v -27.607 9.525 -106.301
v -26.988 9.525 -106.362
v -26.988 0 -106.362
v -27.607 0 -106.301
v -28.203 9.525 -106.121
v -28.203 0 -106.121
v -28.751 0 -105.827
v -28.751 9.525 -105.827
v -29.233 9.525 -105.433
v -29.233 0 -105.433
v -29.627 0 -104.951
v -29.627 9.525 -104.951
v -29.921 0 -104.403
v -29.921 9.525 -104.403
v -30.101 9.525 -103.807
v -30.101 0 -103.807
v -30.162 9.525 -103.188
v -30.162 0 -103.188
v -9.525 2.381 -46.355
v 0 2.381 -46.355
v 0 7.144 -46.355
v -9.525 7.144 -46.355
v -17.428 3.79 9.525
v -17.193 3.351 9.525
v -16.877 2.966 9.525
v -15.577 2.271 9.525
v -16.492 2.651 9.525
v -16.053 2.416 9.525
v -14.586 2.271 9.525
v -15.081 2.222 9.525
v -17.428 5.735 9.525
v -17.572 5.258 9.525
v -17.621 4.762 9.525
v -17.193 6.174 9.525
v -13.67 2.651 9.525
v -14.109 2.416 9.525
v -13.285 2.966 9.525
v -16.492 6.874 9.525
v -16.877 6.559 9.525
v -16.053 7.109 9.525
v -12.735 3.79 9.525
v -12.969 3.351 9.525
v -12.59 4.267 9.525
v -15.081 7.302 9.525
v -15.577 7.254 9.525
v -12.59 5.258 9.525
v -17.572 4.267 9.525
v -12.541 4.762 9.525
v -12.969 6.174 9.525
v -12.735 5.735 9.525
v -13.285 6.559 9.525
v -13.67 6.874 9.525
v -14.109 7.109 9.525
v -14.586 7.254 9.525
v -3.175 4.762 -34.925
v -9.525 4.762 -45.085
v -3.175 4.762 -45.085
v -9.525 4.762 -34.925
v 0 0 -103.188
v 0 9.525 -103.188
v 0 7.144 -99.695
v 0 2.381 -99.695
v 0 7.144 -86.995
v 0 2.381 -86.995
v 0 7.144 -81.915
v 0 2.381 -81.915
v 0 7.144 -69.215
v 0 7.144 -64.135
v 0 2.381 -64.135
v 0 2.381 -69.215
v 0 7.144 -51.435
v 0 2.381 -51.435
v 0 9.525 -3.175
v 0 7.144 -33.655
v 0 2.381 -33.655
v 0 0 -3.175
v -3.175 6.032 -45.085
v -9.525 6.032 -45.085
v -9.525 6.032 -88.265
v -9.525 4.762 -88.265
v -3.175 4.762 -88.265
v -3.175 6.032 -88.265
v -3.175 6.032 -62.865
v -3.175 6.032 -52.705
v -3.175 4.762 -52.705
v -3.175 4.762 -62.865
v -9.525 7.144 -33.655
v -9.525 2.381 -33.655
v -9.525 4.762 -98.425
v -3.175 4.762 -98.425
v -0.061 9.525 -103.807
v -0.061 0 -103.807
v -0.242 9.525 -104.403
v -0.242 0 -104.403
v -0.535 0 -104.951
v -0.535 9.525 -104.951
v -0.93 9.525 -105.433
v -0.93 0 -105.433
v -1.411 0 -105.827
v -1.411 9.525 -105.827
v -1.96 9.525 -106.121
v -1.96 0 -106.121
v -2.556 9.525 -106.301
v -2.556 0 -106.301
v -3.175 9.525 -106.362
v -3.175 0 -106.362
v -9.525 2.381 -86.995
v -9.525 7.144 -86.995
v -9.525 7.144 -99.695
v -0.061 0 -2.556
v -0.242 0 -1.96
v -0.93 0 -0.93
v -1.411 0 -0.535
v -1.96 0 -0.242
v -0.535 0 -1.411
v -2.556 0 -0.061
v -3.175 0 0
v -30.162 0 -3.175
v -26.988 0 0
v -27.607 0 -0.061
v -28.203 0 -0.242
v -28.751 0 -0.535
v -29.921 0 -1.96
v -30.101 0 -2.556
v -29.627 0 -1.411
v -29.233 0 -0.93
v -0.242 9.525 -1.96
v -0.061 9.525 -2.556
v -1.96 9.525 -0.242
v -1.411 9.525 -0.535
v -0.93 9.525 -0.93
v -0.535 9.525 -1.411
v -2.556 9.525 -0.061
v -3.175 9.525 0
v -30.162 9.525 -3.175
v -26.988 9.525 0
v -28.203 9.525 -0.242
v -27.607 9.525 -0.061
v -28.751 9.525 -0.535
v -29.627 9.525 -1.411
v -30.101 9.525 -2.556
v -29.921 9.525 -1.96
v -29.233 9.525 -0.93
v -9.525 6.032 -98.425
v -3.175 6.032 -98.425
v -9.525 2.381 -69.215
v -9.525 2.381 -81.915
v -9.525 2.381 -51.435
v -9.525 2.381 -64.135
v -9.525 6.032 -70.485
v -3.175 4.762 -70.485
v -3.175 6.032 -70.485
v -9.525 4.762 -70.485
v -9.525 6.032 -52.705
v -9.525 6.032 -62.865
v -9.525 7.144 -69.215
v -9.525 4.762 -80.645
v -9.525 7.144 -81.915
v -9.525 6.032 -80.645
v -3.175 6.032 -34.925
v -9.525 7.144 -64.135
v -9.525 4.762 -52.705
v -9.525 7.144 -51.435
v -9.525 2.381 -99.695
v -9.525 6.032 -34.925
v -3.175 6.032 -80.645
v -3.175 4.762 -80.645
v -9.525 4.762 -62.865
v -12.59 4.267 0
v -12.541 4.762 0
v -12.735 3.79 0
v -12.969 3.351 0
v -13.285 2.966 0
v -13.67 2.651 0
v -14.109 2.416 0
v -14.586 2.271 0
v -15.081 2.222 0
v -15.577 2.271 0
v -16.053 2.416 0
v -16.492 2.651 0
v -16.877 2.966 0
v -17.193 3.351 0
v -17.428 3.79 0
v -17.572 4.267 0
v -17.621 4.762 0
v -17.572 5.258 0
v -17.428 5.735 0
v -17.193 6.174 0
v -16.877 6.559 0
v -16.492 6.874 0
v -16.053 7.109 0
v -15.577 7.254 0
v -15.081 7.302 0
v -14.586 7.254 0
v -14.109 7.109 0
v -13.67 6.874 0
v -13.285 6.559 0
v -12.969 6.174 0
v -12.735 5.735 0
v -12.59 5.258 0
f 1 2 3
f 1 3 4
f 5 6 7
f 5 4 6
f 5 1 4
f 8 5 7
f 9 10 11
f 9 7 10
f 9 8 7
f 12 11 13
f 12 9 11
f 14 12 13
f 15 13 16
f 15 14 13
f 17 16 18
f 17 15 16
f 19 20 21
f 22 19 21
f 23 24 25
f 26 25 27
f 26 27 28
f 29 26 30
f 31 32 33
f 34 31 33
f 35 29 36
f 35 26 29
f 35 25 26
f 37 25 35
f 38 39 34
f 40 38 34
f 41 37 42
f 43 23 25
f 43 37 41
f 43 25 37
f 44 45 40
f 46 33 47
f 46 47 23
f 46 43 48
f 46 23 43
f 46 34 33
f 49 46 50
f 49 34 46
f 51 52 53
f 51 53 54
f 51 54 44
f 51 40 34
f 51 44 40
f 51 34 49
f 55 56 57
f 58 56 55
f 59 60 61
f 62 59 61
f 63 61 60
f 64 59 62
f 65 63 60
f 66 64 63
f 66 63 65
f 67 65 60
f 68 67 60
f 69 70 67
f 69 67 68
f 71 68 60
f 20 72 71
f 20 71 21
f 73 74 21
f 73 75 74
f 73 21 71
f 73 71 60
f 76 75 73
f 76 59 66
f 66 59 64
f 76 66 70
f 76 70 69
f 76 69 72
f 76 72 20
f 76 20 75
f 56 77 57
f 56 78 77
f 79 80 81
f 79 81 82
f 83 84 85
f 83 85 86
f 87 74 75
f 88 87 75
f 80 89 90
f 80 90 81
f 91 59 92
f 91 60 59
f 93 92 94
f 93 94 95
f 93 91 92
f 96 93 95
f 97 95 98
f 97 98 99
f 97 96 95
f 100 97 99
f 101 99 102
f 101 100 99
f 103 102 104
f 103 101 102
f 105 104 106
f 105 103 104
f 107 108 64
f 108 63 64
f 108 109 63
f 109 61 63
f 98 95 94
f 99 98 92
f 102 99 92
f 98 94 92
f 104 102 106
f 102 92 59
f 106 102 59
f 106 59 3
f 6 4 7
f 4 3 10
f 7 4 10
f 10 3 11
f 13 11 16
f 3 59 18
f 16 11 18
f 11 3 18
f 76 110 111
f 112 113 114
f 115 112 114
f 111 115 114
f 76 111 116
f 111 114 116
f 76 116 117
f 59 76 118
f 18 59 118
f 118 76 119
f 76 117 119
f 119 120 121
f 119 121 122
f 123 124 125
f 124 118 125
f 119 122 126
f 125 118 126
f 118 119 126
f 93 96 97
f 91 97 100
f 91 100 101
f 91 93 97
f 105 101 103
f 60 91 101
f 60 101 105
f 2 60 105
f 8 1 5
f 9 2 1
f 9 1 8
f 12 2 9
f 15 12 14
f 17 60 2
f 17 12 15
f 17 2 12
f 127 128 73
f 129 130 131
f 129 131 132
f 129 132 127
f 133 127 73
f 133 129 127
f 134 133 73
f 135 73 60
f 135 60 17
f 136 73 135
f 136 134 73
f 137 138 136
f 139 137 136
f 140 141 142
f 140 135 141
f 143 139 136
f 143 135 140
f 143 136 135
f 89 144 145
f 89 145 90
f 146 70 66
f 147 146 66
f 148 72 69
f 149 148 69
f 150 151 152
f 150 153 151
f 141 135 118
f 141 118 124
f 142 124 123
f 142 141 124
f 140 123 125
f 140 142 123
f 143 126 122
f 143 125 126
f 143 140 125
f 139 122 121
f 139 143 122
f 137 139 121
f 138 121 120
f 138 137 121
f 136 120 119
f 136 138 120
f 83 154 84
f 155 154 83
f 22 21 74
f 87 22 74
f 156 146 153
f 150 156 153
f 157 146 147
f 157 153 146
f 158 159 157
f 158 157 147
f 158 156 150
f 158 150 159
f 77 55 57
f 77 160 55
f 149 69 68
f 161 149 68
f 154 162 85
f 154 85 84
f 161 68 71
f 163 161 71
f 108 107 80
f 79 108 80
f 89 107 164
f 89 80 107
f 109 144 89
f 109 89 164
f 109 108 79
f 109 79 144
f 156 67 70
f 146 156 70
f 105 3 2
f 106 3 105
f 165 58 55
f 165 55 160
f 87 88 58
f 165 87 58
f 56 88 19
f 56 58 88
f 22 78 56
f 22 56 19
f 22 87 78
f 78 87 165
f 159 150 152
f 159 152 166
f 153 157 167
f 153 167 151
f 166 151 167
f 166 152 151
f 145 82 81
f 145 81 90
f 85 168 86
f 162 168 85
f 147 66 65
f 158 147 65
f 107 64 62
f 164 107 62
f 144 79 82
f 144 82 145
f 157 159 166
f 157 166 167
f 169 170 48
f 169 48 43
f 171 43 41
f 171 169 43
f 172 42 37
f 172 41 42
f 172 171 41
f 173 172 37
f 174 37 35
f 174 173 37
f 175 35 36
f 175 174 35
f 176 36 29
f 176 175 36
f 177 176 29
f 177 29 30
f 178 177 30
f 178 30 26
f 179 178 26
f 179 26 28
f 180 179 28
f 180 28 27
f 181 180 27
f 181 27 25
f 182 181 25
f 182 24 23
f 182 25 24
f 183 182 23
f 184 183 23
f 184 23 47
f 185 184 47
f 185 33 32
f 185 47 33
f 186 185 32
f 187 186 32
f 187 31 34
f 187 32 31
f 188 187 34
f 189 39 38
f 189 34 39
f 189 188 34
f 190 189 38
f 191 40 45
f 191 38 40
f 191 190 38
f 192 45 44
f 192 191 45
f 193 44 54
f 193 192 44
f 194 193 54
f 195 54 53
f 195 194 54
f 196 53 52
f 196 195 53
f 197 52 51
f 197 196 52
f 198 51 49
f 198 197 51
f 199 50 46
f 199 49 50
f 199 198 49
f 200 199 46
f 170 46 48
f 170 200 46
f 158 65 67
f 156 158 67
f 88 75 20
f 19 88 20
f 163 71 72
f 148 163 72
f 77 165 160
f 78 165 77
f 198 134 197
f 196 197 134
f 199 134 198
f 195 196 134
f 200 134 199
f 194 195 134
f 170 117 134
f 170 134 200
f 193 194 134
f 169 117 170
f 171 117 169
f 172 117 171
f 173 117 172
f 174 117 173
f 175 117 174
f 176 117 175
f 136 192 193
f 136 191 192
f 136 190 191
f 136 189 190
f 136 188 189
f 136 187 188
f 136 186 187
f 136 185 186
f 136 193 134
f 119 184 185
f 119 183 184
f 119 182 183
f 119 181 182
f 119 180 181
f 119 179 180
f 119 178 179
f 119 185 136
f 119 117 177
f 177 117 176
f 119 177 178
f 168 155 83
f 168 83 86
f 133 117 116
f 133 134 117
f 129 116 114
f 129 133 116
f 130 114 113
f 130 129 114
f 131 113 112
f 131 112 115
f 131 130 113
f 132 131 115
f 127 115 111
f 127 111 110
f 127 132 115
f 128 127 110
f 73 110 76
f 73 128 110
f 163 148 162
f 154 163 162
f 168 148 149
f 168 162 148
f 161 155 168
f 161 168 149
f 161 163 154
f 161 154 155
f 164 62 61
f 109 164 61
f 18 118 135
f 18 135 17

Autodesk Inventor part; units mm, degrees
ref_plane "YZ Plane" through (0, 0, 0) normal (1, 0, 0) x (0, 1, 0)
ref_plane "XZ Plane" through (0, 0, 0) normal (0, 1, 0) x (-1, 0, 0)
ref_plane "XY Plane" through (0, 0, 0) normal (0, 0, 1) x (1, 0, 0)
sketch "Sketch1" plane through (0, 0, 0) normal (0, 1, 0) x (-1, 0, 0)
  line L0 (0, 0) -> (30.1625, 0)
  line L1 (30.1625, 0) -> (30.1625, -106.3625)
  line L2 (30.1625, -106.3625) -> (0, -106.3625)
  line L3 (0, -106.3625) -> (0, 0)
  dimension "d0" = 30.1625
  dimension "d1" = 106.3625
extrude "Extrusion1" add sketch "Sketch1" along normal blind 9.525
sketch "Sketch2" plane through (0, 0, 0) normal (1, 0, 0) x (0, 0, -1)
  line L0 (0, 0) -> (0, 9.525) construction
  line L1 (0, 9.525) -> (106.3625, 9.525) construction
  line L2 (106.3625, 0) -> (106.3625, 9.525) construction
  line L3 (28.575, 9.525) -> (106.3625, 9.525) construction
  line L4 (106.3625, 9.525) -> (106.3625, 0) construction
  line L5 (106.3625, 0) -> (28.575, 0) construction
  line L6 (28.575, 0) -> (28.575, 9.525) construction
  line L7 (28.575, 4.7625) -> (28.575, 0) construction
  line L8 (28.575, 4.7625) -> (28.575, 2.3813) construction
  line L9 (28.575, 2.3813) -> (33.655, 2.3813) construction
  line L10 (33.655, 2.3813) -> (46.355, 2.3813)
  line L11 (46.355, 2.3813) -> (46.355, 7.1437)
  line L12 (46.355, 7.1437) -> (33.655, 7.1438)
  line L13 (33.655, 7.1438) -> (33.655, 2.3813)
  line L14 (46.355, 2.3813) -> (51.435, 2.3813) construction
  line L15 (51.435, 2.3813) -> (64.135, 2.3813)
  line L16 (64.135, 2.3813) -> (64.135, 7.1437)
  line L17 (64.135, 7.1437) -> (51.435, 7.1437)
  line L18 (51.435, 7.1437) -> (51.435, 2.3813)
  line L19 (64.135, 2.3813) -> (69.215, 2.3813)
  line L20 (69.215, 2.3813) -> (81.915, 2.3813)
  line L21 (81.915, 2.3813) -> (81.915, 7.1437)
  line L22 (81.915, 7.1437) -> (69.215, 7.1437)
  line L23 (69.215, 7.1437) -> (69.215, 2.3813)
  line L24 (81.915, 2.3813) -> (86.995, 2.3813)
  line L25 (81.915, 7.1437) -> (81.915, 2.3813)
  line L26 (86.995, 2.3813) -> (99.695, 2.3813)
  line L27 (99.695, 2.3813) -> (99.695, 7.1437)
  line L28 (99.695, 7.1437) -> (86.995, 7.1437)
  line L29 (86.995, 7.1437) -> (86.995, 2.3813)
  dimension "d7" = 2.3813
  dimension "d9" = 12.7
  dimension "d10" = 4.7625
  dimension "d12" = 12.7
  dimension "d13" = 4.7625
  dimension "d15" = 12.7
  dimension "d16" = 4.7625
  dimension "d20" = 28.575
  dimension "d21" = 12.7
  dimension "d22" = 4.7625
  dimension "d23" = 5.08
  dimension "d24" = 5.08
  dimension "d25" = 5.08
  dimension "d26" = 5.08
extrude "Extrusion2" cut sketch "Sketch2" against normal blind 9.525
fillet "Fillet1" radius 3.175 4 edges at (0, 4.7625, 0) (-30.1625, 4.7625, 0) (-30.1625, 4.7625, -106.3625) (0, 4.7625, -106.3625)
sketch "Sketch3" plane through (-26.9875, 0, 0) normal (0, 0, 1) x (1, 0, 0)
  line L0 (0, 0) -> (23.8125, 0) construction
  line L1 (11.9062, 0) -> (11.9062, 9.525) construction
  line L2 (23.8125, 9.525) -> (0, 9.525) construction
  circle A0 centre (11.9062, 4.7625) radius 2.54
  point P0 (26.9875, 0)
  dimension "d30" = 5.08
extrude "Extrusion3" add sketch "Sketch3" along normal blind 9.525
sketch "Sketch4" plane through (-9.525, 0, 0) normal (1, 0, 0) x (0, 0, -1)
  line L0 (33.655, 2.3813) -> (33.655, 7.1438) construction
  line L1 (33.655, 4.7625) -> (99.695, 4.7625) construction
  line L2 (99.695, 7.1437) -> (99.695, 2.3813) construction
  line L3 (40.005, 4.7625) -> (34.925, 4.7625) construction
  line L4 (34.925, 4.7625) -> (34.925, 6.0325) construction
  line L5 (34.925, 6.0325) -> (40.005, 6.0325) construction
  line L6 (40.005, 6.0325) -> (40.005, 4.7625) construction
  line L7 (57.785, 4.7625) -> (52.705, 4.7625) construction
  line L8 (52.705, 4.7625) -> (52.705, 6.0325) construction
  line L9 (52.705, 6.0325) -> (57.785, 6.0325) construction
  line L10 (57.785, 6.0325) -> (57.785, 4.7625) construction
  line L11 (75.565, 4.7625) -> (70.485, 4.7625) construction
  line L12 (70.485, 4.7625) -> (70.485, 6.0325) construction
  line L13 (70.485, 6.0325) -> (75.565, 6.0325) construction
  line L14 (75.565, 6.0325) -> (75.565, 4.7625) construction
  line L15 (93.345, 4.7625) -> (88.265, 4.7625) construction
  line L16 (88.265, 4.7625) -> (88.265, 6.0325) construction
  line L17 (88.265, 6.0325) -> (93.345, 6.0325) construction
  line L18 (93.345, 6.0325) -> (93.345, 4.7625) construction
  line L19 (93.345, 4.7625) -> (98.425, 4.7625) construction
  line L20 (75.565, 4.7625) -> (80.645, 4.7625) construction
  line L21 (57.785, 4.7625) -> (62.865, 4.7625) construction
  line L22 (40.005, 4.7625) -> (45.085, 4.7625) construction
  line L23 (34.925, 6.0325) -> (45.085, 6.0325)
  line L24 (45.085, 6.0325) -> (45.085, 4.7625)
  line L25 (45.085, 4.7625) -> (34.925, 4.7625)
  line L26 (34.925, 4.7625) -> (34.925, 6.0325)
  line L27 (52.705, 6.0325) -> (62.865, 6.0325)
  line L28 (62.865, 6.0325) -> (62.865, 4.7625)
  line L29 (62.865, 4.7625) -> (52.705, 4.7625)
  line L30 (52.705, 4.7625) -> (52.705, 6.0325)
  line L31 (70.485, 6.0325) -> (80.645, 6.0325)
  line L32 (80.645, 6.0325) -> (80.645, 4.7625)
  line L33 (80.645, 4.7625) -> (70.485, 4.7625)
  line L34 (70.485, 4.7625) -> (70.485, 6.0325)
  line L35 (88.265, 6.0325) -> (98.425, 6.0325)
  line L36 (98.425, 6.0325) -> (98.425, 4.7625)
  line L37 (98.425, 4.7625) -> (88.265, 4.7625)
  line L38 (88.265, 4.7625) -> (88.265, 6.0325)
  point P0 (0, 0)
  dimension "d33" = 5.08
  dimension "d34" = 1.27
  dimension "d35" = 5.08
  dimension "d36" = 1.27
  dimension "d37" = 5.08
  dimension "d38" = 1.27
  dimension "d39" = 5.08
  dimension "d40" = 1.27
  dimension "d41" = 5.08
  dimension "d42" = 5.08
  dimension "d43" = 5.08
  dimension "d44" = 5.08
extrude "Extrusion4" add sketch "Sketch4" along normal blind 6.35
properties part number "usbHub" material "ABS Plastic"
